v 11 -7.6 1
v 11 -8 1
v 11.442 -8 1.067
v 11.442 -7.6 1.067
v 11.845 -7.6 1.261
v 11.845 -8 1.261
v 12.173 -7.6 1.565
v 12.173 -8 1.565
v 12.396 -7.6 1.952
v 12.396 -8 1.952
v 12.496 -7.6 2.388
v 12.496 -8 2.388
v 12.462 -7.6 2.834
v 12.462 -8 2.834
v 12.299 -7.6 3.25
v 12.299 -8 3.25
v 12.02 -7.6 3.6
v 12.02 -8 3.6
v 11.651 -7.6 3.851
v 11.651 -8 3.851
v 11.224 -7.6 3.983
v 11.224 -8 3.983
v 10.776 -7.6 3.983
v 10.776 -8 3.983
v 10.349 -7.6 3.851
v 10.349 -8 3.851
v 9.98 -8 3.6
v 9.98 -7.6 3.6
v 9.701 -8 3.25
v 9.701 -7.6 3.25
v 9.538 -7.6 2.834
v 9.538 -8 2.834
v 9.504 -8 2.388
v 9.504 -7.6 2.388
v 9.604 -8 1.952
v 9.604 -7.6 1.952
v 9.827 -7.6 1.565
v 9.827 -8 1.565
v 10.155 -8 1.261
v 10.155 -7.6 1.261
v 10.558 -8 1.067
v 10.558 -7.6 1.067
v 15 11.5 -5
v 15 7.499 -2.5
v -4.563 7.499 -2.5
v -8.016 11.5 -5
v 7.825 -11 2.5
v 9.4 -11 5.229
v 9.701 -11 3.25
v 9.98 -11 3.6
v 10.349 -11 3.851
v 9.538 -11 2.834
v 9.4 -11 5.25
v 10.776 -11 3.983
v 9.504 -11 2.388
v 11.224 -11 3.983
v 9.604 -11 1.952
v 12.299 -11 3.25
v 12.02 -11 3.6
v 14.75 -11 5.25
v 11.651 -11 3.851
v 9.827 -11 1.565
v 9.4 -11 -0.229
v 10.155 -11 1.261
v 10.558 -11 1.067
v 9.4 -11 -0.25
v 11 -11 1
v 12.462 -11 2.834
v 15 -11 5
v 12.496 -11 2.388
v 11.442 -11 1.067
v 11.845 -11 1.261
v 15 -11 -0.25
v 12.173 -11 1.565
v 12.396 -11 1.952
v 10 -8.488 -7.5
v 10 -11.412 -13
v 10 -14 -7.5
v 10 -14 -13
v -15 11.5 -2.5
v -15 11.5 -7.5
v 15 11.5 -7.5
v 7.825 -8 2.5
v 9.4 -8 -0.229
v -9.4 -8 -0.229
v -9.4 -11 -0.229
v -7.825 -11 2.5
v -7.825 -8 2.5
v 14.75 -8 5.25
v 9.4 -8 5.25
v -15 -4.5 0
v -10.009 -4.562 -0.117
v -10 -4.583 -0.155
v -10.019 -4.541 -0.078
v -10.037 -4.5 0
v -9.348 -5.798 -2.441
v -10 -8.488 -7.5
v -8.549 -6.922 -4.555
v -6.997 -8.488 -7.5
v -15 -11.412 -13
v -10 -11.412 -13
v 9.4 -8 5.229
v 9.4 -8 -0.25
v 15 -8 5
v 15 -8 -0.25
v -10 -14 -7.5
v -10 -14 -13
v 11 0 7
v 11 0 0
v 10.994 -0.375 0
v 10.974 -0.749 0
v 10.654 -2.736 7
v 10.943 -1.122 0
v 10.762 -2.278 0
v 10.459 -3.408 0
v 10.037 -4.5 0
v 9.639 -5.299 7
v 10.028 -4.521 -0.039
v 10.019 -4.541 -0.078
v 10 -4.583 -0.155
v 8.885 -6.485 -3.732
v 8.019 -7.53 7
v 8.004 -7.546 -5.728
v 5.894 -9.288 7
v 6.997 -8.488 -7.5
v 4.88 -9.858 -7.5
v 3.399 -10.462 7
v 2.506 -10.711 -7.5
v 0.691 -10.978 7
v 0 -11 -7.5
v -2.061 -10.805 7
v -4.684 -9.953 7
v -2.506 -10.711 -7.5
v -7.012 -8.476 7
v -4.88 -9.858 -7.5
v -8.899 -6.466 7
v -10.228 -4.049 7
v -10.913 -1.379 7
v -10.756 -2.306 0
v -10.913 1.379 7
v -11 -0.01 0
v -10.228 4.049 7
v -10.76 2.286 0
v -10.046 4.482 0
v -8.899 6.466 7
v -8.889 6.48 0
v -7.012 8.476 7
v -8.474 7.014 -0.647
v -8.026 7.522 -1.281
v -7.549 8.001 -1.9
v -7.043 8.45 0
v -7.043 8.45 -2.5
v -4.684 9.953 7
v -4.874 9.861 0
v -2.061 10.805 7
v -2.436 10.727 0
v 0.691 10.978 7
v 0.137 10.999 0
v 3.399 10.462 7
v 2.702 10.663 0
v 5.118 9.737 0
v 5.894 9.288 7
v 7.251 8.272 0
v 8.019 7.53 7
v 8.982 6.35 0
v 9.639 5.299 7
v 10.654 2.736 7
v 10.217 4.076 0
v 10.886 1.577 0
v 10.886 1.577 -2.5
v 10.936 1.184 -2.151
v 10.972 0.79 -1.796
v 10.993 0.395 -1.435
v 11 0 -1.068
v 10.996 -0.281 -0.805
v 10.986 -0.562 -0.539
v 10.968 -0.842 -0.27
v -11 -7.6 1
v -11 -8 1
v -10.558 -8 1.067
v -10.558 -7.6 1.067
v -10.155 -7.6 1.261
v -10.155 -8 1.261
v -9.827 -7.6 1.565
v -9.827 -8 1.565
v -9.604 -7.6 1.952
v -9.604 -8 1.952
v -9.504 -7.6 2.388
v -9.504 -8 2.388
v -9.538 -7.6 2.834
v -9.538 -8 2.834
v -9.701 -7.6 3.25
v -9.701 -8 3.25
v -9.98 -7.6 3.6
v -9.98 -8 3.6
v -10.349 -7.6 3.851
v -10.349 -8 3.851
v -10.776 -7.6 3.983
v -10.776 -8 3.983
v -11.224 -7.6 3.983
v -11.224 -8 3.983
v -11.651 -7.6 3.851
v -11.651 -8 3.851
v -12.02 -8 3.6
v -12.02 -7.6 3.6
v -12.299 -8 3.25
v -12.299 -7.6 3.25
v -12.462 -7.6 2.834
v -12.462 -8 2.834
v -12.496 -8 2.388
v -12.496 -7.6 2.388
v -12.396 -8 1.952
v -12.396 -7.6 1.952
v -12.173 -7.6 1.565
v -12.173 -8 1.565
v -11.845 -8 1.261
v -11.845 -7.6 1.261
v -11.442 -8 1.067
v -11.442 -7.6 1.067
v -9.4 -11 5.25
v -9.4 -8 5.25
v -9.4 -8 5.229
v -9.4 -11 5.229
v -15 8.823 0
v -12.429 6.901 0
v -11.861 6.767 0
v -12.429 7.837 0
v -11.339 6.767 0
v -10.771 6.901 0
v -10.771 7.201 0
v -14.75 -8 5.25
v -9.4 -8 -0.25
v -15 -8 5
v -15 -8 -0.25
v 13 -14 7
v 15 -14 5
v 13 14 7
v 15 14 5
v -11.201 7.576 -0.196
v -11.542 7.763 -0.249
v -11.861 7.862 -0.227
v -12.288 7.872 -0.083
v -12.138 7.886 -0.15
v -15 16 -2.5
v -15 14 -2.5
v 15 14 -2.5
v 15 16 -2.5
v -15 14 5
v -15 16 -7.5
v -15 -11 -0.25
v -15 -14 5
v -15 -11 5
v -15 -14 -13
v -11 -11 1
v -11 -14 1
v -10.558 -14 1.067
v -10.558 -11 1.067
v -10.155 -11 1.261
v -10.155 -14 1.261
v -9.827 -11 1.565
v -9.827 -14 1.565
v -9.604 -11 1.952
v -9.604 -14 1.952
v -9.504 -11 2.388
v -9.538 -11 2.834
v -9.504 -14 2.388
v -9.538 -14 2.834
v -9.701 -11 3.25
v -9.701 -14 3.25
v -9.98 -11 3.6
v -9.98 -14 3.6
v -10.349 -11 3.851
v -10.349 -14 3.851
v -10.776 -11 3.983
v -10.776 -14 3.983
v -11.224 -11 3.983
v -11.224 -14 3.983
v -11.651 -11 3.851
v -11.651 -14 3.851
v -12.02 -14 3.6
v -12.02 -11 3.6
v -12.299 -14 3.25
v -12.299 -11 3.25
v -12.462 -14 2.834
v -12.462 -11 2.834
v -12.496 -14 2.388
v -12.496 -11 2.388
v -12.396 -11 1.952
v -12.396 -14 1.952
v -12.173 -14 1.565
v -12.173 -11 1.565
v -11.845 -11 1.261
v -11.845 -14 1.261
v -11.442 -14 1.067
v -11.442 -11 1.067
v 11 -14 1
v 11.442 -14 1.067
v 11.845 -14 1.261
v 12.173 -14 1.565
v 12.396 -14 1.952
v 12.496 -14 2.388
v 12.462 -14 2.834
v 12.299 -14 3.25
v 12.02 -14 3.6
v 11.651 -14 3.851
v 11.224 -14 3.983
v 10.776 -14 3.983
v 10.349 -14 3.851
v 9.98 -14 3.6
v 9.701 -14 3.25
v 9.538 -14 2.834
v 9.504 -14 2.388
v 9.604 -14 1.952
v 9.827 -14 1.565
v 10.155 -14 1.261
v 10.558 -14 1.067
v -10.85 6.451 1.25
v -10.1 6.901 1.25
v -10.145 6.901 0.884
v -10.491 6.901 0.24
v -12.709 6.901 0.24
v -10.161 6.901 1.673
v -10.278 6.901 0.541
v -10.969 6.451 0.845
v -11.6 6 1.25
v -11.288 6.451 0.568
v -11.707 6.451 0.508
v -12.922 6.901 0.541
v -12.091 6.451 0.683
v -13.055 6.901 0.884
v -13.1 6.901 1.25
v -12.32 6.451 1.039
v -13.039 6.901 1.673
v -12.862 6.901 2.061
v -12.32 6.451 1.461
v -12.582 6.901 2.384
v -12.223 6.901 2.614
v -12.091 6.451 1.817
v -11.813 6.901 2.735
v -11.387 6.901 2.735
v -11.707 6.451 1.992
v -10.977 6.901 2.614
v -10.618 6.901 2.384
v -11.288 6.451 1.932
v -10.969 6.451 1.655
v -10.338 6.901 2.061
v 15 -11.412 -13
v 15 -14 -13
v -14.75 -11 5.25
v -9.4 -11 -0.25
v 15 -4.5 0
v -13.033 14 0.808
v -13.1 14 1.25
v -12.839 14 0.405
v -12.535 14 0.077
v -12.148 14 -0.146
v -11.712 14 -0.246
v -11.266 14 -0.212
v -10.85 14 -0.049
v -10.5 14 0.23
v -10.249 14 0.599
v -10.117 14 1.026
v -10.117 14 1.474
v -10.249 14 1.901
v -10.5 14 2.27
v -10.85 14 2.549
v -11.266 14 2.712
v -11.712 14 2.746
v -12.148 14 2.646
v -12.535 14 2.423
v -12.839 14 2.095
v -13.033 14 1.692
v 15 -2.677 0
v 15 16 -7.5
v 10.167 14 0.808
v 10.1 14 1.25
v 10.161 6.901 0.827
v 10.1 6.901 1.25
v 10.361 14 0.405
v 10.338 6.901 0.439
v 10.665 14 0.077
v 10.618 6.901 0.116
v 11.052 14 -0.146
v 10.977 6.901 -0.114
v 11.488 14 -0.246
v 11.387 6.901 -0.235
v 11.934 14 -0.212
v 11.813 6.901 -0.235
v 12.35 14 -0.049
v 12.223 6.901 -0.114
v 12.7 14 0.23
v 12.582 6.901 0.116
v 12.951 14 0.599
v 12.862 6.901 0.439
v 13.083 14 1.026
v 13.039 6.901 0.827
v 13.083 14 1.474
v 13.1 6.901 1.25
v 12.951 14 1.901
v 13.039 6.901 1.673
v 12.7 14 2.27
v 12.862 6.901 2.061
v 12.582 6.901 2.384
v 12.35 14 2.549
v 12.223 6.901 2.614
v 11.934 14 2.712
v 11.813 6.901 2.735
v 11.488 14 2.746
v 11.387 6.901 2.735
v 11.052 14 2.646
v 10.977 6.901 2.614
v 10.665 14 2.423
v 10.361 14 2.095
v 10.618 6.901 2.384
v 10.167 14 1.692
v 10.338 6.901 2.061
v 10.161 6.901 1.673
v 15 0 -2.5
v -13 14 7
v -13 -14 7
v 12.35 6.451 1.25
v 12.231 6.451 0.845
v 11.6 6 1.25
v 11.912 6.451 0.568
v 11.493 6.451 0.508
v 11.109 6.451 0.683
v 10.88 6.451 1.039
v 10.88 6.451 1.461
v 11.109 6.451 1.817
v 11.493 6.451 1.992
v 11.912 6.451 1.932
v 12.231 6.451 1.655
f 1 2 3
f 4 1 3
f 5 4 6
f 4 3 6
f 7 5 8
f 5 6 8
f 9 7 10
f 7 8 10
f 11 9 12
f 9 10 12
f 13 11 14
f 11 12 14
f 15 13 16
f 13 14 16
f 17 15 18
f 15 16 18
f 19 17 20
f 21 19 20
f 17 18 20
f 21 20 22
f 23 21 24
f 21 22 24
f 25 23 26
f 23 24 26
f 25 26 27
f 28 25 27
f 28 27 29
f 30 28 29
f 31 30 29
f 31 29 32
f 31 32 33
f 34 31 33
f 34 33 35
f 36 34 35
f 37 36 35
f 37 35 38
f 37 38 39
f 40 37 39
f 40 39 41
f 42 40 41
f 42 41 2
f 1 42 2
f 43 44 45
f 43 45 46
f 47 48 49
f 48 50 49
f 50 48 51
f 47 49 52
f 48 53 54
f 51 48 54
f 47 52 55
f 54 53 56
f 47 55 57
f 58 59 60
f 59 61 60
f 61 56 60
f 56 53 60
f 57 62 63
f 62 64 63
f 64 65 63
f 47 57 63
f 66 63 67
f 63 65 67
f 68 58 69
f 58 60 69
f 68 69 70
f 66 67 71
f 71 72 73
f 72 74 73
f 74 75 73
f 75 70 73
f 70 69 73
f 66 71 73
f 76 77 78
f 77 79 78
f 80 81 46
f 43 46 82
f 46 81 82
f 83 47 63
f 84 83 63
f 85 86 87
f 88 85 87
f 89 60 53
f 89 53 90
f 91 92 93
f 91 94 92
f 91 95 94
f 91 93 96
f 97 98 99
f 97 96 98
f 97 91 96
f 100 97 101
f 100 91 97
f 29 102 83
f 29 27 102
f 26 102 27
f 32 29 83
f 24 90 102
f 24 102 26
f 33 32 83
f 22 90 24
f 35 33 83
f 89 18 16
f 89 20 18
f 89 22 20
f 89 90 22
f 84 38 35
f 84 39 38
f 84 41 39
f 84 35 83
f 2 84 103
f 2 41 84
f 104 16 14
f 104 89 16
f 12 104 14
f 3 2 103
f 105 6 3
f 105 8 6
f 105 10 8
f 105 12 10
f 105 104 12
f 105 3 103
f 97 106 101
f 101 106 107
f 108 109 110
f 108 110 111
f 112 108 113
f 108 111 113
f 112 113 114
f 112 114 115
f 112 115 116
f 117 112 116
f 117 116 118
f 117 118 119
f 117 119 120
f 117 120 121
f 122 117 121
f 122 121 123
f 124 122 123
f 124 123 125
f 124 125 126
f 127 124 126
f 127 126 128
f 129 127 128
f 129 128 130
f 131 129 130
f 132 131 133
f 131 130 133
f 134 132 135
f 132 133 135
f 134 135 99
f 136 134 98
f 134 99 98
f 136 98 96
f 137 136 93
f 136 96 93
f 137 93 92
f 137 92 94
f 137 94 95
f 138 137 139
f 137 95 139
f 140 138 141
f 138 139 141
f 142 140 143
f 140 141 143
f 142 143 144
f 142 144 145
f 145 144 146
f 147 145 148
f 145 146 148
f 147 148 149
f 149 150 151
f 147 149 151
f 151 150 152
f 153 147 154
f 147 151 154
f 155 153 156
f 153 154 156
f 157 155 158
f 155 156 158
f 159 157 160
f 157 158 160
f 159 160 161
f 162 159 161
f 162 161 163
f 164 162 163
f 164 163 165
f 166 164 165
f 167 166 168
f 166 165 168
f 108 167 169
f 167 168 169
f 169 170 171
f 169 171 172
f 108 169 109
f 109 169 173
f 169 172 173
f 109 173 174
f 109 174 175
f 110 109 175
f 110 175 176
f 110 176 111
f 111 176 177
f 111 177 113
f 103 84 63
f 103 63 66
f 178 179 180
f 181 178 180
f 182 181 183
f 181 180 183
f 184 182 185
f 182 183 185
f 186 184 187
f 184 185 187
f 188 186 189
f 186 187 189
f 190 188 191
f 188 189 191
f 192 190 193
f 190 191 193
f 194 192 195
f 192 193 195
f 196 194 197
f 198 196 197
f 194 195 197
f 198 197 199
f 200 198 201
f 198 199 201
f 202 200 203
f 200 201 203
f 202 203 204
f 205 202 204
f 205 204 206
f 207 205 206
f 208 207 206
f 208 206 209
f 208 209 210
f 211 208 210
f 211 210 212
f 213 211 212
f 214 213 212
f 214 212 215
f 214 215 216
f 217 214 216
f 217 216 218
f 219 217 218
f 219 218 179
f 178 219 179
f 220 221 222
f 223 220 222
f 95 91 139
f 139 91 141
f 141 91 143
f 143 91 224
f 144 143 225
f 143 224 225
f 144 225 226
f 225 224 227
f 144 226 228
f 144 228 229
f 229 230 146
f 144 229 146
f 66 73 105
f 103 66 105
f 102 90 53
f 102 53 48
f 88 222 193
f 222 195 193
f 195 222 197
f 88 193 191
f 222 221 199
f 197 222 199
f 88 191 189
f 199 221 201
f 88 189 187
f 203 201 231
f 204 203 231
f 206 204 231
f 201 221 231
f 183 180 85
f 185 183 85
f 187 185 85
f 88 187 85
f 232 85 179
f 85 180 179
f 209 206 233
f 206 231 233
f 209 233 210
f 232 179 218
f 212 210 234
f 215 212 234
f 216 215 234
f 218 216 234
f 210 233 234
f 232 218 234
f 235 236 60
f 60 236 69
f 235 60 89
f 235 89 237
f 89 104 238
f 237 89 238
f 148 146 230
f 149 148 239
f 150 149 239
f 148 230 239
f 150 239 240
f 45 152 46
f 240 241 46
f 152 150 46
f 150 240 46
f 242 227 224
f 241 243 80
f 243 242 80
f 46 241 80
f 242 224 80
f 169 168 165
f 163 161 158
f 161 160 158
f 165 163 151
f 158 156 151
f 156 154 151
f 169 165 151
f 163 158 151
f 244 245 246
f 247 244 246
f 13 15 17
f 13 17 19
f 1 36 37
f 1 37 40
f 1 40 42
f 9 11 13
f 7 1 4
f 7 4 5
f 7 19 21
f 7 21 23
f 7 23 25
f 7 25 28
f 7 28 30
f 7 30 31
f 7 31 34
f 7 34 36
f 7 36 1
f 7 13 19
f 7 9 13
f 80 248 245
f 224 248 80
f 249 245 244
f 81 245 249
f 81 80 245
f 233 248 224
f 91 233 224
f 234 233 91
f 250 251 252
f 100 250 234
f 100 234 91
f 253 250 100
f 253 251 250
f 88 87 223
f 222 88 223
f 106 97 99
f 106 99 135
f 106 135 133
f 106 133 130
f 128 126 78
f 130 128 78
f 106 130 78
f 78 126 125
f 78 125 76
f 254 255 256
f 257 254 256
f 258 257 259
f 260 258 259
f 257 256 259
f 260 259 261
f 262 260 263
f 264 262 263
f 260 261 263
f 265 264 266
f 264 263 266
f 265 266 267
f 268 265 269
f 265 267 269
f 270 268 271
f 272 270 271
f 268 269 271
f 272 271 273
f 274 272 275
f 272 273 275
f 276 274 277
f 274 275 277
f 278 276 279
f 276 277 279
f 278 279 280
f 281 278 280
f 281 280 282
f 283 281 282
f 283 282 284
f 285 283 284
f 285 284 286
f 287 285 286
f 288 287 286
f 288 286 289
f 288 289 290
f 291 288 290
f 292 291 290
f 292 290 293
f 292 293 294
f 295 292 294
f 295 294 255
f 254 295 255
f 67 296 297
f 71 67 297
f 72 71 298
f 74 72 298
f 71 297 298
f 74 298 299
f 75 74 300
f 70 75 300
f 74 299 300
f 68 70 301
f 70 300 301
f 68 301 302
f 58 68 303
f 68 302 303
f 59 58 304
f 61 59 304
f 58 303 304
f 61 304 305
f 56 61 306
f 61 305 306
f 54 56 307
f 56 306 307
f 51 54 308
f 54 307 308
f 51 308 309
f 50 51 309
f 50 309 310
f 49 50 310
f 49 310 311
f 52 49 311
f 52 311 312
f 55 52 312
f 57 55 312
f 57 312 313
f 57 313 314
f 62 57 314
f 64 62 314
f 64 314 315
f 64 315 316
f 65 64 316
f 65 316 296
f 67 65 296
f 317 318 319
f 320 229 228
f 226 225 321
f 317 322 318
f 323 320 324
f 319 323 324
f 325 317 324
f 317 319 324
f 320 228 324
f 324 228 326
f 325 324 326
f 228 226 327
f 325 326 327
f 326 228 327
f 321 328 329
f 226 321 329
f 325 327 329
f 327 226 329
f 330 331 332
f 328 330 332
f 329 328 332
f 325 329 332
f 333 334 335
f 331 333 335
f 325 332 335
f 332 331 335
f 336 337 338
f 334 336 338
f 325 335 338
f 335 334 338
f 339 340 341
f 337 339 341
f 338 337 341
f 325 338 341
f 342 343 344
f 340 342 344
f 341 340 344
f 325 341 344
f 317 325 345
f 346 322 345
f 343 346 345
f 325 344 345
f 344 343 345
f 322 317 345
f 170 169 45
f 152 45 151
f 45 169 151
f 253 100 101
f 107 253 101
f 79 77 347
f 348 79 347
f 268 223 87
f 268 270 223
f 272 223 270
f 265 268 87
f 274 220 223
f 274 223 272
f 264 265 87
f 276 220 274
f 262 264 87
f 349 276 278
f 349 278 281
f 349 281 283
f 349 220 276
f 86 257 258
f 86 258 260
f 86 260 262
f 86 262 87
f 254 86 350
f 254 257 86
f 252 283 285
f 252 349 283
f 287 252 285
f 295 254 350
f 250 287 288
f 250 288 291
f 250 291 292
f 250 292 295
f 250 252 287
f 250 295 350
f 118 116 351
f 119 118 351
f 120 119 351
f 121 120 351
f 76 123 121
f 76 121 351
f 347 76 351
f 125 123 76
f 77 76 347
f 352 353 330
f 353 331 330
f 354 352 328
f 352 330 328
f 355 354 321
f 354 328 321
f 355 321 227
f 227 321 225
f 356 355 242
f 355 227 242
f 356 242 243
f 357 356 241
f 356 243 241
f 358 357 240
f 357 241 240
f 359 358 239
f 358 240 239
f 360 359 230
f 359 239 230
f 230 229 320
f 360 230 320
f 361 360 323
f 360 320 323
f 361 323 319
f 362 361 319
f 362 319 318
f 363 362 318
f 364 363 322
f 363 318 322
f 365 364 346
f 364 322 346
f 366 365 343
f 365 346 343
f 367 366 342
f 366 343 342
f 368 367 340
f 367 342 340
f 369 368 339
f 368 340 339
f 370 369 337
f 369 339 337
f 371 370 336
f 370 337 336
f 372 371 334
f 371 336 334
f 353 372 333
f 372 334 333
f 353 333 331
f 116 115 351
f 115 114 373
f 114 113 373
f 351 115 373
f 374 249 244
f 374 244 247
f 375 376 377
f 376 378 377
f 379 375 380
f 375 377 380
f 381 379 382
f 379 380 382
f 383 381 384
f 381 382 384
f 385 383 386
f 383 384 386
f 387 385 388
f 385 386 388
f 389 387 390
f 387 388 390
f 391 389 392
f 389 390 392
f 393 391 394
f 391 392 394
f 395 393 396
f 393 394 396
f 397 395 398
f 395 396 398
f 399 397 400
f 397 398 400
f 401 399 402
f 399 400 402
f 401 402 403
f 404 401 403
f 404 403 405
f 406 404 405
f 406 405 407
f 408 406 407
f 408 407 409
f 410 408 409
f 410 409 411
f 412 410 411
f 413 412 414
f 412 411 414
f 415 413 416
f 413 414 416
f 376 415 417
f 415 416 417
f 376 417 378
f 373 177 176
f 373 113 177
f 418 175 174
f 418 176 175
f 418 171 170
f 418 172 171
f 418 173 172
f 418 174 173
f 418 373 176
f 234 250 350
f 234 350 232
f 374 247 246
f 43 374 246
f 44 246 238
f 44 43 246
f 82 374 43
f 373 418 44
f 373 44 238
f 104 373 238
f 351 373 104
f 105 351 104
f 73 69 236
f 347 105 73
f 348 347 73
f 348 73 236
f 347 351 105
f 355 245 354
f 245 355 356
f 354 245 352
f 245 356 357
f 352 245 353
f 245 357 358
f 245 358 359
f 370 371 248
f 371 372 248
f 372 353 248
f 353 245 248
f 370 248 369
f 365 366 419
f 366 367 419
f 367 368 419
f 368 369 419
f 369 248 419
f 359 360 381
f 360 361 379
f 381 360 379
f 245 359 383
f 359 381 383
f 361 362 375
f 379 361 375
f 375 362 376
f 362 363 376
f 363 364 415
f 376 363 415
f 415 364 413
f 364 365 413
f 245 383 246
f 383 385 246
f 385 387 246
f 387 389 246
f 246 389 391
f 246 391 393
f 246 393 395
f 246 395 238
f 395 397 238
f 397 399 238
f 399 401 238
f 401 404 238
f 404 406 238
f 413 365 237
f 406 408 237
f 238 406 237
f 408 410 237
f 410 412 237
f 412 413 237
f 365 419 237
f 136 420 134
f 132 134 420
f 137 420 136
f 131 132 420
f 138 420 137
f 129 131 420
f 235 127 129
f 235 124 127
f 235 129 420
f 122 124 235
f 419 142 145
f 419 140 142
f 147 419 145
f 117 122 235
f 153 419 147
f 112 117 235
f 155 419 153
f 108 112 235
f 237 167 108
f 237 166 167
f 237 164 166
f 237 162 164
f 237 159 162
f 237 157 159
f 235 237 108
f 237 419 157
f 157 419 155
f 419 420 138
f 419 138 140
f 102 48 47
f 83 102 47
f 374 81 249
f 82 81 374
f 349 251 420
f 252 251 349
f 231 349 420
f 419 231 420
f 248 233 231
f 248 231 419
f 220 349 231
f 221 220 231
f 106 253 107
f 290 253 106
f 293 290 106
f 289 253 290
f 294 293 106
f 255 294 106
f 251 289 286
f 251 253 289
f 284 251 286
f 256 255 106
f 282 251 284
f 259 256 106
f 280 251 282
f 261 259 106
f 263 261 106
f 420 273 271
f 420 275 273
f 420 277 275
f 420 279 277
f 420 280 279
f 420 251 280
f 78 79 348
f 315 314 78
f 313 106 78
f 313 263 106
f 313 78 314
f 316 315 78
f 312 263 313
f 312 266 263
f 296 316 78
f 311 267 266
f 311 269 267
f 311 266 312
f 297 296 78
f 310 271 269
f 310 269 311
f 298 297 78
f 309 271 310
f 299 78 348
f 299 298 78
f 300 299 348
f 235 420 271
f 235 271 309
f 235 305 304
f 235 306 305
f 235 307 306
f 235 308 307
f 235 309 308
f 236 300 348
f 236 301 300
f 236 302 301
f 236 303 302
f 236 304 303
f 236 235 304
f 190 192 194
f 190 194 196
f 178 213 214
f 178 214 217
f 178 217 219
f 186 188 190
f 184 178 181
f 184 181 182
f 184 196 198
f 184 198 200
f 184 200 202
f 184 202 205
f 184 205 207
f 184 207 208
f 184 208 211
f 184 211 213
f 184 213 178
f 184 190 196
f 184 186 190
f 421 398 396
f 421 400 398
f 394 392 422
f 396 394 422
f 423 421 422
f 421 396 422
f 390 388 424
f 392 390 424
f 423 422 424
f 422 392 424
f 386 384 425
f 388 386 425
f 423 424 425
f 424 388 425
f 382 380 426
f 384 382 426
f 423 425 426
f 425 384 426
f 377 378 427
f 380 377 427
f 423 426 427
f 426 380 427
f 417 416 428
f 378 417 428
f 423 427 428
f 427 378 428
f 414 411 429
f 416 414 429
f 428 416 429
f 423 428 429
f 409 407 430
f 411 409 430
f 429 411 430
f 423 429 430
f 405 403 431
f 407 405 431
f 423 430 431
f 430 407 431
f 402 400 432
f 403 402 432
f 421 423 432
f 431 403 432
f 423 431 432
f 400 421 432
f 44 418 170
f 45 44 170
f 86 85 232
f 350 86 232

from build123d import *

# Parameters (mm, degrees)
SKETCH1_W                 = 30
SKETCH1_H                 = 28
SKETCH1_R                 = 11
BOSS_EXTRUDE1_DEPTH       = 7
SKETCH2_W                 = 5
SKETCH2_H                 = 2.5
BOSS_EXTRUDE2_DEPTH       = 13
CHAMFER2_SIZE             = 2
BOSS_EXTRUDE6_DEPTH       = 2.5
CHAMFER3_SIZE             = 2
CHAMFER4_SIZE             = 2
BOSS_EXTRUDE4_DEPTH       = 2.5
CHAMFER6_SIZE             = 2.5
CHAMFER7_SIZE             = 7
CHAMFER7_SIZE_2           = 13.165085257
SKETCH7_R                 = 1.5
CUT_EXTRUDE2_DEPTH        = 6.4
BOSS_EXTRUDE7_START       = -2.5
SKETCH8_W                 = 30
SKETCH8_H                 = 5
BOSS_EXTRUDE7_DEPTH       = 4.5
CHAMFER8_SIZE             = 4.000836323
CHAMFER8_SIZE_2           = 2.5
CUT_EXTRUDE3_START        = -3
SKETCH9_R                 = 1.5
CUT_EXTRUDE3_DEPTH        = 3
SKETCH10_W                = 5.5
SKETCH10_H                = 3
CUT_EXTRUDE4_DEPTH        = 5.6
CUT_EXTRUDE5_START        = -30
SKETCH10_2_W              = 5.5
SKETCH10_2_H              = 3
CUT_EXTRUDE5_DEPTH        = 5.6
F_1_0MM_DOWEL_HOLE1_D     = 3
F_1_0MM_DOWEL_HOLE1_DEPTH = 7.098709071
F_1_0MM_DOWEL_HOLE1_TIP   = 0.901290929


with BuildPart() as part:
    # Sketch1 → Boss-Extrude1 (new body)
    with BuildSketch(Plane.XY):
        Rectangle(SKETCH1_W, SKETCH1_H)
        Circle(SKETCH1_R, mode=Mode.SUBTRACT)
    extrude(amount=BOSS_EXTRUDE1_DEPTH)

    # Sketch2 → Boss-Extrude2 (add)
    with BuildSketch(Plane(origin=(0, 0, 0), x_dir=(-1, 0, 0), z_dir=(0, 0, -1))):
        with Locations((-12.5, -12.75)):
            Rectangle(SKETCH2_W, SKETCH2_H)
        with Locations((12.5, -12.75)):
            Rectangle(SKETCH2_W, SKETCH2_H)
    extrude(amount=BOSS_EXTRUDE2_DEPTH)

    # Chamfer2
    chamfer2_edges = [part.edges().sort_by_distance(p)[0] for p in [
        (-10, -12.75, 0),
        (10, -12.75, 0),
    ]]
    chamfer(chamfer2_edges, length=CHAMFER2_SIZE)

    # Sketch5 → Boss-Extrude6 (add)
    with BuildSketch(Plane.XZ.offset(14)):
        Polygon((-10, -2), (-10, -7.5), (10, -7.5), (10, -2), (8, 0), (-8, 0), align=None)
    extrude(amount=-BOSS_EXTRUDE6_DEPTH)

    # Chamfer3
    chamfer3_edges = [part.edges().sort_by_distance(p)[0] for p in [
        (15, 0, 7),
    ]]
    chamfer(chamfer3_edges, length=CHAMFER3_SIZE)

    # Chamfer4
    chamfer4_edges = [part.edges().sort_by_distance(p)[0] for p in [
        (-15, 0, 7),
    ]]
    chamfer(chamfer4_edges, length=CHAMFER4_SIZE)

    # Sketch4 → Boss-Extrude4 (add)
    with BuildSketch(Plane(origin=(0, 0, 0), x_dir=(-1, 0, 0), z_dir=(0, 0, -1))):
        Polygon((-15, 0), (15, 11.5), (15, 14), (-15, 14), align=None)
    extrude(amount=BOSS_EXTRUDE4_DEPTH)

    # Chamfer6
    # the kernel refuses this chamfer: 2.5 mm, written as the material it adds along each edge
    with BuildSketch(Plane(origin=(21.003247512, -2.30124488, 0), x_dir=(-0.3578006820796162, -0.9333930836859554, 0.02749587661058638), z_dir=(-0.9337461173020497, 0.35793601163245237, 0))) as chamfer6_piece_1_section:
        Polygon((CHAMFER6_SIZE * 0.999621916911, -CHAMFER6_SIZE * 0.0274958766106), (-CHAMFER6_SIZE * 0.0274958766106, -CHAMFER6_SIZE * 0.999621916911), (0, 0), align=None)
    chamfer6_piece_1 = extrude(amount=17.263908412, mode=Mode.PRIVATE)
    chamfer6_piece_1 = chamfer6_piece_1 - Plane(origin=(0, 0, -0.835393566), x_dir=(1, 0, 0), z_dir=(0, 0, -1)) * Cylinder(11, 45, mode=Mode.PRIVATE)
    chamfer6_piece_1 = split(chamfer6_piece_1, bisect_by=Plane(origin=(15, -0.113968884, -0.835393566), z_dir=(-1, 0, 0)), keep=Keep.TOP, mode=Mode.PRIVATE)
    add(chamfer6_piece_1)
    with BuildSketch(Plane(origin=(-1.03959441, 6.148511191, 0), x_dir=(-0.35780068207961624, -0.9333930836859554, 0.02749587661058638), z_dir=(-0.9337461173020497, 0.35793601163245237, 0))) as chamfer6_piece_2_section:
        Polygon((CHAMFER6_SIZE * 0.999621916911, -CHAMFER6_SIZE * 0.0274958766106), (-CHAMFER6_SIZE * 0.0274958766106, -CHAMFER6_SIZE * 0.999621916911), (0, 0), align=None)
    chamfer6_piece_2 = extrude(amount=21.380172546, mode=Mode.PRIVATE)
    chamfer6_piece_2 = chamfer6_piece_2 - Plane(origin=(0, 0, -0.851534645), x_dir=(1, 0, 0), z_dir=(0, 0, -1)) * Cylinder(11, 53, mode=Mode.PRIVATE)
    chamfer6_piece_2 = split(chamfer6_piece_2, bisect_by=Plane(origin=(-15, 9.244820467, -0.851534645), z_dir=(1, 0, 0)), keep=Keep.TOP, mode=Mode.PRIVATE)
    add(chamfer6_piece_2)

    # Chamfer7
    # the kernel refuses this chamfer: 13.165085257, 7 mm, written as the material it adds along each edge
    with BuildSketch(Plane(origin=(-15, -11.5, 0), x_dir=(0, 0.9979482451756082, 0.06402577567608186), z_dir=(1, 0, 0))) as chamfer7_piece_1_section:
        Polygon((CHAMFER7_SIZE * 0.997948245176, -CHAMFER7_SIZE * 0.0640257756761), (-CHAMFER7_SIZE_2 * 0.0640257756781, -CHAMFER7_SIZE_2 * 0.997948245208), (0, 0), align=None)
    chamfer7_piece_1 = extrude(amount=30, mode=Mode.PRIVATE)
    chamfer7_piece_1 = chamfer7_piece_1 - Plane(origin=(0, 0, -3.073682767), x_dir=(1, 0, 0), z_dir=(0, 0, -1)) * Cylinder(11, 113, mode=Mode.PRIVATE)
    chamfer7_piece_1 = split(chamfer7_piece_1, bisect_by=Plane(origin=(-10, -8.887755394, -3.073682767), z_dir=(-1, 0, 0)), keep=Keep.TOP, mode=Mode.PRIVATE)
    chamfer7_piece_1 = split(chamfer7_piece_1, bisect_by=Plane(origin=(-12.500128058, -8.887755394, -7.5), z_dir=(0, 0, 1)), keep=Keep.TOP, mode=Mode.PRIVATE)
    add(chamfer7_piece_1)
    with BuildSketch(Plane(origin=(-15, -11.5, 0), x_dir=(0, 0.9979482451756082, 0.06402577567608186), z_dir=(1, 0, 0))) as chamfer7_piece_2_section:
        Polygon((CHAMFER7_SIZE * 0.997948245176, -CHAMFER7_SIZE * 0.0640257756761), (-CHAMFER7_SIZE_2 * 0.0640257756781, -CHAMFER7_SIZE_2 * 0.997948245208), (0, 0), align=None)
    chamfer7_piece_2 = extrude(amount=30, mode=Mode.PRIVATE)
    chamfer7_piece_2 = split(chamfer7_piece_2, bisect_by=Plane(origin=(-10, -10.721530873, -9.597564575), z_dir=(-1, 0, 0)), keep=Keep.TOP, mode=Mode.PRIVATE)
    chamfer7_piece_2 = split(chamfer7_piece_2, bisect_by=Plane(origin=(-12.5, -10.721530873, -7.5), z_dir=(0, 0, -1)), keep=Keep.TOP, mode=Mode.PRIVATE)
    chamfer7_piece_2 = split(chamfer7_piece_2, bisect_by=Plane(origin=(-12.5, -10.721530873, -13), z_dir=(0, 0, 1)), keep=Keep.TOP, mode=Mode.PRIVATE)
    add(chamfer7_piece_2)
    with BuildSketch(Plane(origin=(-15, -11.5, 0), x_dir=(0, 0.9979482451756082, 0.06402577567608186), z_dir=(1, 0, 0))) as chamfer7_piece_3_section:
        Polygon((CHAMFER7_SIZE * 0.997948245176, -CHAMFER7_SIZE * 0.0640257756761), (-CHAMFER7_SIZE_2 * 0.0640257756781, -CHAMFER7_SIZE_2 * 0.997948245208), (0, 0), align=None)
    chamfer7_piece_3 = extrude(amount=30, mode=Mode.PRIVATE)
    chamfer7_piece_3 = chamfer7_piece_3 - Plane(origin=(0, 0, -3.793876077), x_dir=(1, 0, 0), z_dir=(0, 0, -1)) * Cylinder(11, 113, mode=Mode.PRIVATE)
    chamfer7_piece_3 = split(chamfer7_piece_3, bisect_by=Plane(origin=(-10, -6.598719884, -3.793876077), z_dir=(1, 0, 0)), keep=Keep.TOP, mode=Mode.PRIVATE)
    chamfer7_piece_3 = split(chamfer7_piece_3, bisect_by=Plane(origin=(-9.499486782, -6.598719884, -7.5), z_dir=(0, 0, 1)), keep=Keep.TOP, mode=Mode.PRIVATE)
    chamfer7_piece_3 = split(chamfer7_piece_3, bisect_by=Plane(origin=(10, -6.598719884, -3.793876077), z_dir=(-1, 0, 0)), keep=Keep.TOP, mode=Mode.PRIVATE)
    add(chamfer7_piece_3)
    with BuildSketch(Plane(origin=(-15, -11.5, 0), x_dir=(0, 0.9979482451756082, 0.06402577567608186), z_dir=(1, 0, 0))) as chamfer7_piece_4_section:
        Polygon((CHAMFER7_SIZE * 0.997948245176, -CHAMFER7_SIZE * 0.0640257756761), (-CHAMFER7_SIZE_2 * 0.0640257756781, -CHAMFER7_SIZE_2 * 0.997948245208), (0, 0), align=None)
    chamfer7_piece_4 = extrude(amount=30, mode=Mode.PRIVATE)
    chamfer7_piece_4 = split(chamfer7_piece_4, bisect_by=Plane(origin=(12.5, -10.721530873, -7.5), z_dir=(0, 0, -1)), keep=Keep.TOP, mode=Mode.PRIVATE)
    chamfer7_piece_4 = split(chamfer7_piece_4, bisect_by=Plane(origin=(10, -10.721530873, -9.597564575), z_dir=(1, 0, 0)), keep=Keep.TOP, mode=Mode.PRIVATE)
    chamfer7_piece_4 = split(chamfer7_piece_4, bisect_by=Plane(origin=(12.5, -10.721530873, -13), z_dir=(0, 0, 1)), keep=Keep.TOP, mode=Mode.PRIVATE)
    add(chamfer7_piece_4)
    with BuildSketch(Plane(origin=(-15, -11.5, 0), x_dir=(0, 0.9979482451756082, 0.06402577567608186), z_dir=(1, 0, 0))) as chamfer7_piece_5_section:
        Polygon((CHAMFER7_SIZE * 0.997948245176, -CHAMFER7_SIZE * 0.0640257756761), (-CHAMFER7_SIZE_2 * 0.0640257756781, -CHAMFER7_SIZE_2 * 0.997948245208), (0, 0), align=None)
    chamfer7_piece_5 = extrude(amount=30, mode=Mode.PRIVATE)
    chamfer7_piece_5 = chamfer7_piece_5 - Plane(origin=(0, 0, -3.073682766), x_dir=(1, 0, 0), z_dir=(0, 0, -1)) * Cylinder(11, 113, mode=Mode.PRIVATE)
    chamfer7_piece_5 = split(chamfer7_piece_5, bisect_by=Plane(origin=(12.500128057, -8.887755394, -7.5), z_dir=(0, 0, 1)), keep=Keep.TOP, mode=Mode.PRIVATE)
    chamfer7_piece_5 = split(chamfer7_piece_5, bisect_by=Plane(origin=(10, -8.887755394, -3.073682766), z_dir=(1, 0, 0)), keep=Keep.TOP, mode=Mode.PRIVATE)
    add(chamfer7_piece_5)

    # Sketch7 → Cut-Extrude2 (cut)
    with BuildSketch(Plane.XZ.offset(14)):
        with Locations(Location((-11, 2.5, 0), (0, 0, 270))):
            Circle(SKETCH7_R)
        with Locations(Location((11, 2.5, 0), (0, 0, 270))):
            Circle(SKETCH7_R)
    extrude(amount=-CUT_EXTRUDE2_DEPTH, mode=Mode.SUBTRACT)

    # Sketch8 → Boss-Extrude7 (add)
    with BuildSketch(Plane(origin=(0, 14, 0), x_dir=(1, 0, 0), z_dir=(0, 1, 0)).offset(BOSS_EXTRUDE7_START)):
        with Locations((0, 5)):
            Rectangle(SKETCH8_W, SKETCH8_H)
    extrude(amount=BOSS_EXTRUDE7_DEPTH)

    # Chamfer8
    # the kernel refuses this chamfer: 4.000836323, 2.5 mm, written as the material it adds along each edge
    with BuildSketch(Plane(origin=(-25.343554005, 11.5, -2.5), x_dir=(0, -0.9997899140358645, 0.02049701910421793), z_dir=(1, 0, 0))) as chamfer8_piece_1_section:
        Polygon((CHAMFER8_SIZE * 0.999789913937, CHAMFER8_SIZE * 0.0204970191022), (-CHAMFER8_SIZE_2 * 0.0204970191042, CHAMFER8_SIZE_2 * 0.999789914036), (0, 0), align=None)
    chamfer8_piece_1 = extrude(amount=40.343554005, mode=Mode.PRIVATE)
    chamfer8_piece_1 = split(chamfer8_piece_1, bisect_by=Plane(origin=(2.975759377, 8.202968449, -5.855581208), z_dir=(0.25309898105600476, 0.6602582114512465, 0.707106781186274)), keep=Keep.TOP, mode=Mode.PRIVATE)
    add(chamfer8_piece_1)

    # Sketch9 → Cut-Extrude3 (cut)
    # profile 1 of 2: a face of its own
    with BuildSketch(Plane.XZ.offset(14).offset(CUT_EXTRUDE3_START)):
        Polygon((7.824573519, 2.5), (9.41228676, -0.25), (12.58771324, -0.25), (14.175426481, 2.5), (12.58771324, 5.25), (9.41228676, 5.25), align=None)
        with Locations(Location((11, 2.5, 0), (0, 0, 270))):
            Circle(SKETCH9_R, mode=Mode.SUBTRACT)
    # profile 2 of 2: a face of its own
    with BuildSketch(Plane.XZ.offset(14).offset(CUT_EXTRUDE3_START)):
        Polygon((-7.824573519, 2.5), (-9.41228676, 5.25), (-12.58771324, 5.25), (-14.175426481, 2.5), (-12.58771324, -0.25), (-9.41228676, -0.25), align=None)
        with Locations(Location((-11, 2.5, 0), (0, 0, 270))):
            Circle(SKETCH9_R, mode=Mode.SUBTRACT)
    extrude(amount=-CUT_EXTRUDE3_DEPTH, mode=Mode.SUBTRACT)

    # Sketch10 → Cut-Extrude4 (cut)
    with BuildSketch(Plane(origin=(15, 0, 0), x_dir=(0, 0, -1), z_dir=(1, 0, 0))):
        with Locations((-2.5, -9.5)):
            Rectangle(SKETCH10_W, SKETCH10_H)
    extrude(amount=-CUT_EXTRUDE4_DEPTH, mode=Mode.SUBTRACT)

    # Sketch10<2> → Cut-Extrude5 (cut)
    with BuildSketch(Plane(origin=(15, 0, 0), x_dir=(0, 0, -1), z_dir=(1, 0, 0)).offset(CUT_EXTRUDE5_START)):
        with Locations((-2.5, -9.5)):
            Rectangle(SKETCH10_2_W, SKETCH10_2_H)
    extrude(amount=CUT_EXTRUDE5_DEPTH, mode=Mode.SUBTRACT)

    # Ø1.0mm Dowel Hole1
    with Locations(Plane(origin=(0, 14, 0), x_dir=(1, 0, 0), z_dir=(0, 1, 0))):
        with Locations((-11.6, -1.25), (11.6, -1.25)):
            Hole(F_1_0MM_DOWEL_HOLE1_D / 2, depth=F_1_0MM_DOWEL_HOLE1_DEPTH)
            with Locations((0, 0, -(F_1_0MM_DOWEL_HOLE1_DEPTH + F_1_0MM_DOWEL_HOLE1_TIP / 2))):  # 118° drill point
                Cone(0, F_1_0MM_DOWEL_HOLE1_D / 2, F_1_0MM_DOWEL_HOLE1_TIP, mode=Mode.SUBTRACT)


solid = part.part
